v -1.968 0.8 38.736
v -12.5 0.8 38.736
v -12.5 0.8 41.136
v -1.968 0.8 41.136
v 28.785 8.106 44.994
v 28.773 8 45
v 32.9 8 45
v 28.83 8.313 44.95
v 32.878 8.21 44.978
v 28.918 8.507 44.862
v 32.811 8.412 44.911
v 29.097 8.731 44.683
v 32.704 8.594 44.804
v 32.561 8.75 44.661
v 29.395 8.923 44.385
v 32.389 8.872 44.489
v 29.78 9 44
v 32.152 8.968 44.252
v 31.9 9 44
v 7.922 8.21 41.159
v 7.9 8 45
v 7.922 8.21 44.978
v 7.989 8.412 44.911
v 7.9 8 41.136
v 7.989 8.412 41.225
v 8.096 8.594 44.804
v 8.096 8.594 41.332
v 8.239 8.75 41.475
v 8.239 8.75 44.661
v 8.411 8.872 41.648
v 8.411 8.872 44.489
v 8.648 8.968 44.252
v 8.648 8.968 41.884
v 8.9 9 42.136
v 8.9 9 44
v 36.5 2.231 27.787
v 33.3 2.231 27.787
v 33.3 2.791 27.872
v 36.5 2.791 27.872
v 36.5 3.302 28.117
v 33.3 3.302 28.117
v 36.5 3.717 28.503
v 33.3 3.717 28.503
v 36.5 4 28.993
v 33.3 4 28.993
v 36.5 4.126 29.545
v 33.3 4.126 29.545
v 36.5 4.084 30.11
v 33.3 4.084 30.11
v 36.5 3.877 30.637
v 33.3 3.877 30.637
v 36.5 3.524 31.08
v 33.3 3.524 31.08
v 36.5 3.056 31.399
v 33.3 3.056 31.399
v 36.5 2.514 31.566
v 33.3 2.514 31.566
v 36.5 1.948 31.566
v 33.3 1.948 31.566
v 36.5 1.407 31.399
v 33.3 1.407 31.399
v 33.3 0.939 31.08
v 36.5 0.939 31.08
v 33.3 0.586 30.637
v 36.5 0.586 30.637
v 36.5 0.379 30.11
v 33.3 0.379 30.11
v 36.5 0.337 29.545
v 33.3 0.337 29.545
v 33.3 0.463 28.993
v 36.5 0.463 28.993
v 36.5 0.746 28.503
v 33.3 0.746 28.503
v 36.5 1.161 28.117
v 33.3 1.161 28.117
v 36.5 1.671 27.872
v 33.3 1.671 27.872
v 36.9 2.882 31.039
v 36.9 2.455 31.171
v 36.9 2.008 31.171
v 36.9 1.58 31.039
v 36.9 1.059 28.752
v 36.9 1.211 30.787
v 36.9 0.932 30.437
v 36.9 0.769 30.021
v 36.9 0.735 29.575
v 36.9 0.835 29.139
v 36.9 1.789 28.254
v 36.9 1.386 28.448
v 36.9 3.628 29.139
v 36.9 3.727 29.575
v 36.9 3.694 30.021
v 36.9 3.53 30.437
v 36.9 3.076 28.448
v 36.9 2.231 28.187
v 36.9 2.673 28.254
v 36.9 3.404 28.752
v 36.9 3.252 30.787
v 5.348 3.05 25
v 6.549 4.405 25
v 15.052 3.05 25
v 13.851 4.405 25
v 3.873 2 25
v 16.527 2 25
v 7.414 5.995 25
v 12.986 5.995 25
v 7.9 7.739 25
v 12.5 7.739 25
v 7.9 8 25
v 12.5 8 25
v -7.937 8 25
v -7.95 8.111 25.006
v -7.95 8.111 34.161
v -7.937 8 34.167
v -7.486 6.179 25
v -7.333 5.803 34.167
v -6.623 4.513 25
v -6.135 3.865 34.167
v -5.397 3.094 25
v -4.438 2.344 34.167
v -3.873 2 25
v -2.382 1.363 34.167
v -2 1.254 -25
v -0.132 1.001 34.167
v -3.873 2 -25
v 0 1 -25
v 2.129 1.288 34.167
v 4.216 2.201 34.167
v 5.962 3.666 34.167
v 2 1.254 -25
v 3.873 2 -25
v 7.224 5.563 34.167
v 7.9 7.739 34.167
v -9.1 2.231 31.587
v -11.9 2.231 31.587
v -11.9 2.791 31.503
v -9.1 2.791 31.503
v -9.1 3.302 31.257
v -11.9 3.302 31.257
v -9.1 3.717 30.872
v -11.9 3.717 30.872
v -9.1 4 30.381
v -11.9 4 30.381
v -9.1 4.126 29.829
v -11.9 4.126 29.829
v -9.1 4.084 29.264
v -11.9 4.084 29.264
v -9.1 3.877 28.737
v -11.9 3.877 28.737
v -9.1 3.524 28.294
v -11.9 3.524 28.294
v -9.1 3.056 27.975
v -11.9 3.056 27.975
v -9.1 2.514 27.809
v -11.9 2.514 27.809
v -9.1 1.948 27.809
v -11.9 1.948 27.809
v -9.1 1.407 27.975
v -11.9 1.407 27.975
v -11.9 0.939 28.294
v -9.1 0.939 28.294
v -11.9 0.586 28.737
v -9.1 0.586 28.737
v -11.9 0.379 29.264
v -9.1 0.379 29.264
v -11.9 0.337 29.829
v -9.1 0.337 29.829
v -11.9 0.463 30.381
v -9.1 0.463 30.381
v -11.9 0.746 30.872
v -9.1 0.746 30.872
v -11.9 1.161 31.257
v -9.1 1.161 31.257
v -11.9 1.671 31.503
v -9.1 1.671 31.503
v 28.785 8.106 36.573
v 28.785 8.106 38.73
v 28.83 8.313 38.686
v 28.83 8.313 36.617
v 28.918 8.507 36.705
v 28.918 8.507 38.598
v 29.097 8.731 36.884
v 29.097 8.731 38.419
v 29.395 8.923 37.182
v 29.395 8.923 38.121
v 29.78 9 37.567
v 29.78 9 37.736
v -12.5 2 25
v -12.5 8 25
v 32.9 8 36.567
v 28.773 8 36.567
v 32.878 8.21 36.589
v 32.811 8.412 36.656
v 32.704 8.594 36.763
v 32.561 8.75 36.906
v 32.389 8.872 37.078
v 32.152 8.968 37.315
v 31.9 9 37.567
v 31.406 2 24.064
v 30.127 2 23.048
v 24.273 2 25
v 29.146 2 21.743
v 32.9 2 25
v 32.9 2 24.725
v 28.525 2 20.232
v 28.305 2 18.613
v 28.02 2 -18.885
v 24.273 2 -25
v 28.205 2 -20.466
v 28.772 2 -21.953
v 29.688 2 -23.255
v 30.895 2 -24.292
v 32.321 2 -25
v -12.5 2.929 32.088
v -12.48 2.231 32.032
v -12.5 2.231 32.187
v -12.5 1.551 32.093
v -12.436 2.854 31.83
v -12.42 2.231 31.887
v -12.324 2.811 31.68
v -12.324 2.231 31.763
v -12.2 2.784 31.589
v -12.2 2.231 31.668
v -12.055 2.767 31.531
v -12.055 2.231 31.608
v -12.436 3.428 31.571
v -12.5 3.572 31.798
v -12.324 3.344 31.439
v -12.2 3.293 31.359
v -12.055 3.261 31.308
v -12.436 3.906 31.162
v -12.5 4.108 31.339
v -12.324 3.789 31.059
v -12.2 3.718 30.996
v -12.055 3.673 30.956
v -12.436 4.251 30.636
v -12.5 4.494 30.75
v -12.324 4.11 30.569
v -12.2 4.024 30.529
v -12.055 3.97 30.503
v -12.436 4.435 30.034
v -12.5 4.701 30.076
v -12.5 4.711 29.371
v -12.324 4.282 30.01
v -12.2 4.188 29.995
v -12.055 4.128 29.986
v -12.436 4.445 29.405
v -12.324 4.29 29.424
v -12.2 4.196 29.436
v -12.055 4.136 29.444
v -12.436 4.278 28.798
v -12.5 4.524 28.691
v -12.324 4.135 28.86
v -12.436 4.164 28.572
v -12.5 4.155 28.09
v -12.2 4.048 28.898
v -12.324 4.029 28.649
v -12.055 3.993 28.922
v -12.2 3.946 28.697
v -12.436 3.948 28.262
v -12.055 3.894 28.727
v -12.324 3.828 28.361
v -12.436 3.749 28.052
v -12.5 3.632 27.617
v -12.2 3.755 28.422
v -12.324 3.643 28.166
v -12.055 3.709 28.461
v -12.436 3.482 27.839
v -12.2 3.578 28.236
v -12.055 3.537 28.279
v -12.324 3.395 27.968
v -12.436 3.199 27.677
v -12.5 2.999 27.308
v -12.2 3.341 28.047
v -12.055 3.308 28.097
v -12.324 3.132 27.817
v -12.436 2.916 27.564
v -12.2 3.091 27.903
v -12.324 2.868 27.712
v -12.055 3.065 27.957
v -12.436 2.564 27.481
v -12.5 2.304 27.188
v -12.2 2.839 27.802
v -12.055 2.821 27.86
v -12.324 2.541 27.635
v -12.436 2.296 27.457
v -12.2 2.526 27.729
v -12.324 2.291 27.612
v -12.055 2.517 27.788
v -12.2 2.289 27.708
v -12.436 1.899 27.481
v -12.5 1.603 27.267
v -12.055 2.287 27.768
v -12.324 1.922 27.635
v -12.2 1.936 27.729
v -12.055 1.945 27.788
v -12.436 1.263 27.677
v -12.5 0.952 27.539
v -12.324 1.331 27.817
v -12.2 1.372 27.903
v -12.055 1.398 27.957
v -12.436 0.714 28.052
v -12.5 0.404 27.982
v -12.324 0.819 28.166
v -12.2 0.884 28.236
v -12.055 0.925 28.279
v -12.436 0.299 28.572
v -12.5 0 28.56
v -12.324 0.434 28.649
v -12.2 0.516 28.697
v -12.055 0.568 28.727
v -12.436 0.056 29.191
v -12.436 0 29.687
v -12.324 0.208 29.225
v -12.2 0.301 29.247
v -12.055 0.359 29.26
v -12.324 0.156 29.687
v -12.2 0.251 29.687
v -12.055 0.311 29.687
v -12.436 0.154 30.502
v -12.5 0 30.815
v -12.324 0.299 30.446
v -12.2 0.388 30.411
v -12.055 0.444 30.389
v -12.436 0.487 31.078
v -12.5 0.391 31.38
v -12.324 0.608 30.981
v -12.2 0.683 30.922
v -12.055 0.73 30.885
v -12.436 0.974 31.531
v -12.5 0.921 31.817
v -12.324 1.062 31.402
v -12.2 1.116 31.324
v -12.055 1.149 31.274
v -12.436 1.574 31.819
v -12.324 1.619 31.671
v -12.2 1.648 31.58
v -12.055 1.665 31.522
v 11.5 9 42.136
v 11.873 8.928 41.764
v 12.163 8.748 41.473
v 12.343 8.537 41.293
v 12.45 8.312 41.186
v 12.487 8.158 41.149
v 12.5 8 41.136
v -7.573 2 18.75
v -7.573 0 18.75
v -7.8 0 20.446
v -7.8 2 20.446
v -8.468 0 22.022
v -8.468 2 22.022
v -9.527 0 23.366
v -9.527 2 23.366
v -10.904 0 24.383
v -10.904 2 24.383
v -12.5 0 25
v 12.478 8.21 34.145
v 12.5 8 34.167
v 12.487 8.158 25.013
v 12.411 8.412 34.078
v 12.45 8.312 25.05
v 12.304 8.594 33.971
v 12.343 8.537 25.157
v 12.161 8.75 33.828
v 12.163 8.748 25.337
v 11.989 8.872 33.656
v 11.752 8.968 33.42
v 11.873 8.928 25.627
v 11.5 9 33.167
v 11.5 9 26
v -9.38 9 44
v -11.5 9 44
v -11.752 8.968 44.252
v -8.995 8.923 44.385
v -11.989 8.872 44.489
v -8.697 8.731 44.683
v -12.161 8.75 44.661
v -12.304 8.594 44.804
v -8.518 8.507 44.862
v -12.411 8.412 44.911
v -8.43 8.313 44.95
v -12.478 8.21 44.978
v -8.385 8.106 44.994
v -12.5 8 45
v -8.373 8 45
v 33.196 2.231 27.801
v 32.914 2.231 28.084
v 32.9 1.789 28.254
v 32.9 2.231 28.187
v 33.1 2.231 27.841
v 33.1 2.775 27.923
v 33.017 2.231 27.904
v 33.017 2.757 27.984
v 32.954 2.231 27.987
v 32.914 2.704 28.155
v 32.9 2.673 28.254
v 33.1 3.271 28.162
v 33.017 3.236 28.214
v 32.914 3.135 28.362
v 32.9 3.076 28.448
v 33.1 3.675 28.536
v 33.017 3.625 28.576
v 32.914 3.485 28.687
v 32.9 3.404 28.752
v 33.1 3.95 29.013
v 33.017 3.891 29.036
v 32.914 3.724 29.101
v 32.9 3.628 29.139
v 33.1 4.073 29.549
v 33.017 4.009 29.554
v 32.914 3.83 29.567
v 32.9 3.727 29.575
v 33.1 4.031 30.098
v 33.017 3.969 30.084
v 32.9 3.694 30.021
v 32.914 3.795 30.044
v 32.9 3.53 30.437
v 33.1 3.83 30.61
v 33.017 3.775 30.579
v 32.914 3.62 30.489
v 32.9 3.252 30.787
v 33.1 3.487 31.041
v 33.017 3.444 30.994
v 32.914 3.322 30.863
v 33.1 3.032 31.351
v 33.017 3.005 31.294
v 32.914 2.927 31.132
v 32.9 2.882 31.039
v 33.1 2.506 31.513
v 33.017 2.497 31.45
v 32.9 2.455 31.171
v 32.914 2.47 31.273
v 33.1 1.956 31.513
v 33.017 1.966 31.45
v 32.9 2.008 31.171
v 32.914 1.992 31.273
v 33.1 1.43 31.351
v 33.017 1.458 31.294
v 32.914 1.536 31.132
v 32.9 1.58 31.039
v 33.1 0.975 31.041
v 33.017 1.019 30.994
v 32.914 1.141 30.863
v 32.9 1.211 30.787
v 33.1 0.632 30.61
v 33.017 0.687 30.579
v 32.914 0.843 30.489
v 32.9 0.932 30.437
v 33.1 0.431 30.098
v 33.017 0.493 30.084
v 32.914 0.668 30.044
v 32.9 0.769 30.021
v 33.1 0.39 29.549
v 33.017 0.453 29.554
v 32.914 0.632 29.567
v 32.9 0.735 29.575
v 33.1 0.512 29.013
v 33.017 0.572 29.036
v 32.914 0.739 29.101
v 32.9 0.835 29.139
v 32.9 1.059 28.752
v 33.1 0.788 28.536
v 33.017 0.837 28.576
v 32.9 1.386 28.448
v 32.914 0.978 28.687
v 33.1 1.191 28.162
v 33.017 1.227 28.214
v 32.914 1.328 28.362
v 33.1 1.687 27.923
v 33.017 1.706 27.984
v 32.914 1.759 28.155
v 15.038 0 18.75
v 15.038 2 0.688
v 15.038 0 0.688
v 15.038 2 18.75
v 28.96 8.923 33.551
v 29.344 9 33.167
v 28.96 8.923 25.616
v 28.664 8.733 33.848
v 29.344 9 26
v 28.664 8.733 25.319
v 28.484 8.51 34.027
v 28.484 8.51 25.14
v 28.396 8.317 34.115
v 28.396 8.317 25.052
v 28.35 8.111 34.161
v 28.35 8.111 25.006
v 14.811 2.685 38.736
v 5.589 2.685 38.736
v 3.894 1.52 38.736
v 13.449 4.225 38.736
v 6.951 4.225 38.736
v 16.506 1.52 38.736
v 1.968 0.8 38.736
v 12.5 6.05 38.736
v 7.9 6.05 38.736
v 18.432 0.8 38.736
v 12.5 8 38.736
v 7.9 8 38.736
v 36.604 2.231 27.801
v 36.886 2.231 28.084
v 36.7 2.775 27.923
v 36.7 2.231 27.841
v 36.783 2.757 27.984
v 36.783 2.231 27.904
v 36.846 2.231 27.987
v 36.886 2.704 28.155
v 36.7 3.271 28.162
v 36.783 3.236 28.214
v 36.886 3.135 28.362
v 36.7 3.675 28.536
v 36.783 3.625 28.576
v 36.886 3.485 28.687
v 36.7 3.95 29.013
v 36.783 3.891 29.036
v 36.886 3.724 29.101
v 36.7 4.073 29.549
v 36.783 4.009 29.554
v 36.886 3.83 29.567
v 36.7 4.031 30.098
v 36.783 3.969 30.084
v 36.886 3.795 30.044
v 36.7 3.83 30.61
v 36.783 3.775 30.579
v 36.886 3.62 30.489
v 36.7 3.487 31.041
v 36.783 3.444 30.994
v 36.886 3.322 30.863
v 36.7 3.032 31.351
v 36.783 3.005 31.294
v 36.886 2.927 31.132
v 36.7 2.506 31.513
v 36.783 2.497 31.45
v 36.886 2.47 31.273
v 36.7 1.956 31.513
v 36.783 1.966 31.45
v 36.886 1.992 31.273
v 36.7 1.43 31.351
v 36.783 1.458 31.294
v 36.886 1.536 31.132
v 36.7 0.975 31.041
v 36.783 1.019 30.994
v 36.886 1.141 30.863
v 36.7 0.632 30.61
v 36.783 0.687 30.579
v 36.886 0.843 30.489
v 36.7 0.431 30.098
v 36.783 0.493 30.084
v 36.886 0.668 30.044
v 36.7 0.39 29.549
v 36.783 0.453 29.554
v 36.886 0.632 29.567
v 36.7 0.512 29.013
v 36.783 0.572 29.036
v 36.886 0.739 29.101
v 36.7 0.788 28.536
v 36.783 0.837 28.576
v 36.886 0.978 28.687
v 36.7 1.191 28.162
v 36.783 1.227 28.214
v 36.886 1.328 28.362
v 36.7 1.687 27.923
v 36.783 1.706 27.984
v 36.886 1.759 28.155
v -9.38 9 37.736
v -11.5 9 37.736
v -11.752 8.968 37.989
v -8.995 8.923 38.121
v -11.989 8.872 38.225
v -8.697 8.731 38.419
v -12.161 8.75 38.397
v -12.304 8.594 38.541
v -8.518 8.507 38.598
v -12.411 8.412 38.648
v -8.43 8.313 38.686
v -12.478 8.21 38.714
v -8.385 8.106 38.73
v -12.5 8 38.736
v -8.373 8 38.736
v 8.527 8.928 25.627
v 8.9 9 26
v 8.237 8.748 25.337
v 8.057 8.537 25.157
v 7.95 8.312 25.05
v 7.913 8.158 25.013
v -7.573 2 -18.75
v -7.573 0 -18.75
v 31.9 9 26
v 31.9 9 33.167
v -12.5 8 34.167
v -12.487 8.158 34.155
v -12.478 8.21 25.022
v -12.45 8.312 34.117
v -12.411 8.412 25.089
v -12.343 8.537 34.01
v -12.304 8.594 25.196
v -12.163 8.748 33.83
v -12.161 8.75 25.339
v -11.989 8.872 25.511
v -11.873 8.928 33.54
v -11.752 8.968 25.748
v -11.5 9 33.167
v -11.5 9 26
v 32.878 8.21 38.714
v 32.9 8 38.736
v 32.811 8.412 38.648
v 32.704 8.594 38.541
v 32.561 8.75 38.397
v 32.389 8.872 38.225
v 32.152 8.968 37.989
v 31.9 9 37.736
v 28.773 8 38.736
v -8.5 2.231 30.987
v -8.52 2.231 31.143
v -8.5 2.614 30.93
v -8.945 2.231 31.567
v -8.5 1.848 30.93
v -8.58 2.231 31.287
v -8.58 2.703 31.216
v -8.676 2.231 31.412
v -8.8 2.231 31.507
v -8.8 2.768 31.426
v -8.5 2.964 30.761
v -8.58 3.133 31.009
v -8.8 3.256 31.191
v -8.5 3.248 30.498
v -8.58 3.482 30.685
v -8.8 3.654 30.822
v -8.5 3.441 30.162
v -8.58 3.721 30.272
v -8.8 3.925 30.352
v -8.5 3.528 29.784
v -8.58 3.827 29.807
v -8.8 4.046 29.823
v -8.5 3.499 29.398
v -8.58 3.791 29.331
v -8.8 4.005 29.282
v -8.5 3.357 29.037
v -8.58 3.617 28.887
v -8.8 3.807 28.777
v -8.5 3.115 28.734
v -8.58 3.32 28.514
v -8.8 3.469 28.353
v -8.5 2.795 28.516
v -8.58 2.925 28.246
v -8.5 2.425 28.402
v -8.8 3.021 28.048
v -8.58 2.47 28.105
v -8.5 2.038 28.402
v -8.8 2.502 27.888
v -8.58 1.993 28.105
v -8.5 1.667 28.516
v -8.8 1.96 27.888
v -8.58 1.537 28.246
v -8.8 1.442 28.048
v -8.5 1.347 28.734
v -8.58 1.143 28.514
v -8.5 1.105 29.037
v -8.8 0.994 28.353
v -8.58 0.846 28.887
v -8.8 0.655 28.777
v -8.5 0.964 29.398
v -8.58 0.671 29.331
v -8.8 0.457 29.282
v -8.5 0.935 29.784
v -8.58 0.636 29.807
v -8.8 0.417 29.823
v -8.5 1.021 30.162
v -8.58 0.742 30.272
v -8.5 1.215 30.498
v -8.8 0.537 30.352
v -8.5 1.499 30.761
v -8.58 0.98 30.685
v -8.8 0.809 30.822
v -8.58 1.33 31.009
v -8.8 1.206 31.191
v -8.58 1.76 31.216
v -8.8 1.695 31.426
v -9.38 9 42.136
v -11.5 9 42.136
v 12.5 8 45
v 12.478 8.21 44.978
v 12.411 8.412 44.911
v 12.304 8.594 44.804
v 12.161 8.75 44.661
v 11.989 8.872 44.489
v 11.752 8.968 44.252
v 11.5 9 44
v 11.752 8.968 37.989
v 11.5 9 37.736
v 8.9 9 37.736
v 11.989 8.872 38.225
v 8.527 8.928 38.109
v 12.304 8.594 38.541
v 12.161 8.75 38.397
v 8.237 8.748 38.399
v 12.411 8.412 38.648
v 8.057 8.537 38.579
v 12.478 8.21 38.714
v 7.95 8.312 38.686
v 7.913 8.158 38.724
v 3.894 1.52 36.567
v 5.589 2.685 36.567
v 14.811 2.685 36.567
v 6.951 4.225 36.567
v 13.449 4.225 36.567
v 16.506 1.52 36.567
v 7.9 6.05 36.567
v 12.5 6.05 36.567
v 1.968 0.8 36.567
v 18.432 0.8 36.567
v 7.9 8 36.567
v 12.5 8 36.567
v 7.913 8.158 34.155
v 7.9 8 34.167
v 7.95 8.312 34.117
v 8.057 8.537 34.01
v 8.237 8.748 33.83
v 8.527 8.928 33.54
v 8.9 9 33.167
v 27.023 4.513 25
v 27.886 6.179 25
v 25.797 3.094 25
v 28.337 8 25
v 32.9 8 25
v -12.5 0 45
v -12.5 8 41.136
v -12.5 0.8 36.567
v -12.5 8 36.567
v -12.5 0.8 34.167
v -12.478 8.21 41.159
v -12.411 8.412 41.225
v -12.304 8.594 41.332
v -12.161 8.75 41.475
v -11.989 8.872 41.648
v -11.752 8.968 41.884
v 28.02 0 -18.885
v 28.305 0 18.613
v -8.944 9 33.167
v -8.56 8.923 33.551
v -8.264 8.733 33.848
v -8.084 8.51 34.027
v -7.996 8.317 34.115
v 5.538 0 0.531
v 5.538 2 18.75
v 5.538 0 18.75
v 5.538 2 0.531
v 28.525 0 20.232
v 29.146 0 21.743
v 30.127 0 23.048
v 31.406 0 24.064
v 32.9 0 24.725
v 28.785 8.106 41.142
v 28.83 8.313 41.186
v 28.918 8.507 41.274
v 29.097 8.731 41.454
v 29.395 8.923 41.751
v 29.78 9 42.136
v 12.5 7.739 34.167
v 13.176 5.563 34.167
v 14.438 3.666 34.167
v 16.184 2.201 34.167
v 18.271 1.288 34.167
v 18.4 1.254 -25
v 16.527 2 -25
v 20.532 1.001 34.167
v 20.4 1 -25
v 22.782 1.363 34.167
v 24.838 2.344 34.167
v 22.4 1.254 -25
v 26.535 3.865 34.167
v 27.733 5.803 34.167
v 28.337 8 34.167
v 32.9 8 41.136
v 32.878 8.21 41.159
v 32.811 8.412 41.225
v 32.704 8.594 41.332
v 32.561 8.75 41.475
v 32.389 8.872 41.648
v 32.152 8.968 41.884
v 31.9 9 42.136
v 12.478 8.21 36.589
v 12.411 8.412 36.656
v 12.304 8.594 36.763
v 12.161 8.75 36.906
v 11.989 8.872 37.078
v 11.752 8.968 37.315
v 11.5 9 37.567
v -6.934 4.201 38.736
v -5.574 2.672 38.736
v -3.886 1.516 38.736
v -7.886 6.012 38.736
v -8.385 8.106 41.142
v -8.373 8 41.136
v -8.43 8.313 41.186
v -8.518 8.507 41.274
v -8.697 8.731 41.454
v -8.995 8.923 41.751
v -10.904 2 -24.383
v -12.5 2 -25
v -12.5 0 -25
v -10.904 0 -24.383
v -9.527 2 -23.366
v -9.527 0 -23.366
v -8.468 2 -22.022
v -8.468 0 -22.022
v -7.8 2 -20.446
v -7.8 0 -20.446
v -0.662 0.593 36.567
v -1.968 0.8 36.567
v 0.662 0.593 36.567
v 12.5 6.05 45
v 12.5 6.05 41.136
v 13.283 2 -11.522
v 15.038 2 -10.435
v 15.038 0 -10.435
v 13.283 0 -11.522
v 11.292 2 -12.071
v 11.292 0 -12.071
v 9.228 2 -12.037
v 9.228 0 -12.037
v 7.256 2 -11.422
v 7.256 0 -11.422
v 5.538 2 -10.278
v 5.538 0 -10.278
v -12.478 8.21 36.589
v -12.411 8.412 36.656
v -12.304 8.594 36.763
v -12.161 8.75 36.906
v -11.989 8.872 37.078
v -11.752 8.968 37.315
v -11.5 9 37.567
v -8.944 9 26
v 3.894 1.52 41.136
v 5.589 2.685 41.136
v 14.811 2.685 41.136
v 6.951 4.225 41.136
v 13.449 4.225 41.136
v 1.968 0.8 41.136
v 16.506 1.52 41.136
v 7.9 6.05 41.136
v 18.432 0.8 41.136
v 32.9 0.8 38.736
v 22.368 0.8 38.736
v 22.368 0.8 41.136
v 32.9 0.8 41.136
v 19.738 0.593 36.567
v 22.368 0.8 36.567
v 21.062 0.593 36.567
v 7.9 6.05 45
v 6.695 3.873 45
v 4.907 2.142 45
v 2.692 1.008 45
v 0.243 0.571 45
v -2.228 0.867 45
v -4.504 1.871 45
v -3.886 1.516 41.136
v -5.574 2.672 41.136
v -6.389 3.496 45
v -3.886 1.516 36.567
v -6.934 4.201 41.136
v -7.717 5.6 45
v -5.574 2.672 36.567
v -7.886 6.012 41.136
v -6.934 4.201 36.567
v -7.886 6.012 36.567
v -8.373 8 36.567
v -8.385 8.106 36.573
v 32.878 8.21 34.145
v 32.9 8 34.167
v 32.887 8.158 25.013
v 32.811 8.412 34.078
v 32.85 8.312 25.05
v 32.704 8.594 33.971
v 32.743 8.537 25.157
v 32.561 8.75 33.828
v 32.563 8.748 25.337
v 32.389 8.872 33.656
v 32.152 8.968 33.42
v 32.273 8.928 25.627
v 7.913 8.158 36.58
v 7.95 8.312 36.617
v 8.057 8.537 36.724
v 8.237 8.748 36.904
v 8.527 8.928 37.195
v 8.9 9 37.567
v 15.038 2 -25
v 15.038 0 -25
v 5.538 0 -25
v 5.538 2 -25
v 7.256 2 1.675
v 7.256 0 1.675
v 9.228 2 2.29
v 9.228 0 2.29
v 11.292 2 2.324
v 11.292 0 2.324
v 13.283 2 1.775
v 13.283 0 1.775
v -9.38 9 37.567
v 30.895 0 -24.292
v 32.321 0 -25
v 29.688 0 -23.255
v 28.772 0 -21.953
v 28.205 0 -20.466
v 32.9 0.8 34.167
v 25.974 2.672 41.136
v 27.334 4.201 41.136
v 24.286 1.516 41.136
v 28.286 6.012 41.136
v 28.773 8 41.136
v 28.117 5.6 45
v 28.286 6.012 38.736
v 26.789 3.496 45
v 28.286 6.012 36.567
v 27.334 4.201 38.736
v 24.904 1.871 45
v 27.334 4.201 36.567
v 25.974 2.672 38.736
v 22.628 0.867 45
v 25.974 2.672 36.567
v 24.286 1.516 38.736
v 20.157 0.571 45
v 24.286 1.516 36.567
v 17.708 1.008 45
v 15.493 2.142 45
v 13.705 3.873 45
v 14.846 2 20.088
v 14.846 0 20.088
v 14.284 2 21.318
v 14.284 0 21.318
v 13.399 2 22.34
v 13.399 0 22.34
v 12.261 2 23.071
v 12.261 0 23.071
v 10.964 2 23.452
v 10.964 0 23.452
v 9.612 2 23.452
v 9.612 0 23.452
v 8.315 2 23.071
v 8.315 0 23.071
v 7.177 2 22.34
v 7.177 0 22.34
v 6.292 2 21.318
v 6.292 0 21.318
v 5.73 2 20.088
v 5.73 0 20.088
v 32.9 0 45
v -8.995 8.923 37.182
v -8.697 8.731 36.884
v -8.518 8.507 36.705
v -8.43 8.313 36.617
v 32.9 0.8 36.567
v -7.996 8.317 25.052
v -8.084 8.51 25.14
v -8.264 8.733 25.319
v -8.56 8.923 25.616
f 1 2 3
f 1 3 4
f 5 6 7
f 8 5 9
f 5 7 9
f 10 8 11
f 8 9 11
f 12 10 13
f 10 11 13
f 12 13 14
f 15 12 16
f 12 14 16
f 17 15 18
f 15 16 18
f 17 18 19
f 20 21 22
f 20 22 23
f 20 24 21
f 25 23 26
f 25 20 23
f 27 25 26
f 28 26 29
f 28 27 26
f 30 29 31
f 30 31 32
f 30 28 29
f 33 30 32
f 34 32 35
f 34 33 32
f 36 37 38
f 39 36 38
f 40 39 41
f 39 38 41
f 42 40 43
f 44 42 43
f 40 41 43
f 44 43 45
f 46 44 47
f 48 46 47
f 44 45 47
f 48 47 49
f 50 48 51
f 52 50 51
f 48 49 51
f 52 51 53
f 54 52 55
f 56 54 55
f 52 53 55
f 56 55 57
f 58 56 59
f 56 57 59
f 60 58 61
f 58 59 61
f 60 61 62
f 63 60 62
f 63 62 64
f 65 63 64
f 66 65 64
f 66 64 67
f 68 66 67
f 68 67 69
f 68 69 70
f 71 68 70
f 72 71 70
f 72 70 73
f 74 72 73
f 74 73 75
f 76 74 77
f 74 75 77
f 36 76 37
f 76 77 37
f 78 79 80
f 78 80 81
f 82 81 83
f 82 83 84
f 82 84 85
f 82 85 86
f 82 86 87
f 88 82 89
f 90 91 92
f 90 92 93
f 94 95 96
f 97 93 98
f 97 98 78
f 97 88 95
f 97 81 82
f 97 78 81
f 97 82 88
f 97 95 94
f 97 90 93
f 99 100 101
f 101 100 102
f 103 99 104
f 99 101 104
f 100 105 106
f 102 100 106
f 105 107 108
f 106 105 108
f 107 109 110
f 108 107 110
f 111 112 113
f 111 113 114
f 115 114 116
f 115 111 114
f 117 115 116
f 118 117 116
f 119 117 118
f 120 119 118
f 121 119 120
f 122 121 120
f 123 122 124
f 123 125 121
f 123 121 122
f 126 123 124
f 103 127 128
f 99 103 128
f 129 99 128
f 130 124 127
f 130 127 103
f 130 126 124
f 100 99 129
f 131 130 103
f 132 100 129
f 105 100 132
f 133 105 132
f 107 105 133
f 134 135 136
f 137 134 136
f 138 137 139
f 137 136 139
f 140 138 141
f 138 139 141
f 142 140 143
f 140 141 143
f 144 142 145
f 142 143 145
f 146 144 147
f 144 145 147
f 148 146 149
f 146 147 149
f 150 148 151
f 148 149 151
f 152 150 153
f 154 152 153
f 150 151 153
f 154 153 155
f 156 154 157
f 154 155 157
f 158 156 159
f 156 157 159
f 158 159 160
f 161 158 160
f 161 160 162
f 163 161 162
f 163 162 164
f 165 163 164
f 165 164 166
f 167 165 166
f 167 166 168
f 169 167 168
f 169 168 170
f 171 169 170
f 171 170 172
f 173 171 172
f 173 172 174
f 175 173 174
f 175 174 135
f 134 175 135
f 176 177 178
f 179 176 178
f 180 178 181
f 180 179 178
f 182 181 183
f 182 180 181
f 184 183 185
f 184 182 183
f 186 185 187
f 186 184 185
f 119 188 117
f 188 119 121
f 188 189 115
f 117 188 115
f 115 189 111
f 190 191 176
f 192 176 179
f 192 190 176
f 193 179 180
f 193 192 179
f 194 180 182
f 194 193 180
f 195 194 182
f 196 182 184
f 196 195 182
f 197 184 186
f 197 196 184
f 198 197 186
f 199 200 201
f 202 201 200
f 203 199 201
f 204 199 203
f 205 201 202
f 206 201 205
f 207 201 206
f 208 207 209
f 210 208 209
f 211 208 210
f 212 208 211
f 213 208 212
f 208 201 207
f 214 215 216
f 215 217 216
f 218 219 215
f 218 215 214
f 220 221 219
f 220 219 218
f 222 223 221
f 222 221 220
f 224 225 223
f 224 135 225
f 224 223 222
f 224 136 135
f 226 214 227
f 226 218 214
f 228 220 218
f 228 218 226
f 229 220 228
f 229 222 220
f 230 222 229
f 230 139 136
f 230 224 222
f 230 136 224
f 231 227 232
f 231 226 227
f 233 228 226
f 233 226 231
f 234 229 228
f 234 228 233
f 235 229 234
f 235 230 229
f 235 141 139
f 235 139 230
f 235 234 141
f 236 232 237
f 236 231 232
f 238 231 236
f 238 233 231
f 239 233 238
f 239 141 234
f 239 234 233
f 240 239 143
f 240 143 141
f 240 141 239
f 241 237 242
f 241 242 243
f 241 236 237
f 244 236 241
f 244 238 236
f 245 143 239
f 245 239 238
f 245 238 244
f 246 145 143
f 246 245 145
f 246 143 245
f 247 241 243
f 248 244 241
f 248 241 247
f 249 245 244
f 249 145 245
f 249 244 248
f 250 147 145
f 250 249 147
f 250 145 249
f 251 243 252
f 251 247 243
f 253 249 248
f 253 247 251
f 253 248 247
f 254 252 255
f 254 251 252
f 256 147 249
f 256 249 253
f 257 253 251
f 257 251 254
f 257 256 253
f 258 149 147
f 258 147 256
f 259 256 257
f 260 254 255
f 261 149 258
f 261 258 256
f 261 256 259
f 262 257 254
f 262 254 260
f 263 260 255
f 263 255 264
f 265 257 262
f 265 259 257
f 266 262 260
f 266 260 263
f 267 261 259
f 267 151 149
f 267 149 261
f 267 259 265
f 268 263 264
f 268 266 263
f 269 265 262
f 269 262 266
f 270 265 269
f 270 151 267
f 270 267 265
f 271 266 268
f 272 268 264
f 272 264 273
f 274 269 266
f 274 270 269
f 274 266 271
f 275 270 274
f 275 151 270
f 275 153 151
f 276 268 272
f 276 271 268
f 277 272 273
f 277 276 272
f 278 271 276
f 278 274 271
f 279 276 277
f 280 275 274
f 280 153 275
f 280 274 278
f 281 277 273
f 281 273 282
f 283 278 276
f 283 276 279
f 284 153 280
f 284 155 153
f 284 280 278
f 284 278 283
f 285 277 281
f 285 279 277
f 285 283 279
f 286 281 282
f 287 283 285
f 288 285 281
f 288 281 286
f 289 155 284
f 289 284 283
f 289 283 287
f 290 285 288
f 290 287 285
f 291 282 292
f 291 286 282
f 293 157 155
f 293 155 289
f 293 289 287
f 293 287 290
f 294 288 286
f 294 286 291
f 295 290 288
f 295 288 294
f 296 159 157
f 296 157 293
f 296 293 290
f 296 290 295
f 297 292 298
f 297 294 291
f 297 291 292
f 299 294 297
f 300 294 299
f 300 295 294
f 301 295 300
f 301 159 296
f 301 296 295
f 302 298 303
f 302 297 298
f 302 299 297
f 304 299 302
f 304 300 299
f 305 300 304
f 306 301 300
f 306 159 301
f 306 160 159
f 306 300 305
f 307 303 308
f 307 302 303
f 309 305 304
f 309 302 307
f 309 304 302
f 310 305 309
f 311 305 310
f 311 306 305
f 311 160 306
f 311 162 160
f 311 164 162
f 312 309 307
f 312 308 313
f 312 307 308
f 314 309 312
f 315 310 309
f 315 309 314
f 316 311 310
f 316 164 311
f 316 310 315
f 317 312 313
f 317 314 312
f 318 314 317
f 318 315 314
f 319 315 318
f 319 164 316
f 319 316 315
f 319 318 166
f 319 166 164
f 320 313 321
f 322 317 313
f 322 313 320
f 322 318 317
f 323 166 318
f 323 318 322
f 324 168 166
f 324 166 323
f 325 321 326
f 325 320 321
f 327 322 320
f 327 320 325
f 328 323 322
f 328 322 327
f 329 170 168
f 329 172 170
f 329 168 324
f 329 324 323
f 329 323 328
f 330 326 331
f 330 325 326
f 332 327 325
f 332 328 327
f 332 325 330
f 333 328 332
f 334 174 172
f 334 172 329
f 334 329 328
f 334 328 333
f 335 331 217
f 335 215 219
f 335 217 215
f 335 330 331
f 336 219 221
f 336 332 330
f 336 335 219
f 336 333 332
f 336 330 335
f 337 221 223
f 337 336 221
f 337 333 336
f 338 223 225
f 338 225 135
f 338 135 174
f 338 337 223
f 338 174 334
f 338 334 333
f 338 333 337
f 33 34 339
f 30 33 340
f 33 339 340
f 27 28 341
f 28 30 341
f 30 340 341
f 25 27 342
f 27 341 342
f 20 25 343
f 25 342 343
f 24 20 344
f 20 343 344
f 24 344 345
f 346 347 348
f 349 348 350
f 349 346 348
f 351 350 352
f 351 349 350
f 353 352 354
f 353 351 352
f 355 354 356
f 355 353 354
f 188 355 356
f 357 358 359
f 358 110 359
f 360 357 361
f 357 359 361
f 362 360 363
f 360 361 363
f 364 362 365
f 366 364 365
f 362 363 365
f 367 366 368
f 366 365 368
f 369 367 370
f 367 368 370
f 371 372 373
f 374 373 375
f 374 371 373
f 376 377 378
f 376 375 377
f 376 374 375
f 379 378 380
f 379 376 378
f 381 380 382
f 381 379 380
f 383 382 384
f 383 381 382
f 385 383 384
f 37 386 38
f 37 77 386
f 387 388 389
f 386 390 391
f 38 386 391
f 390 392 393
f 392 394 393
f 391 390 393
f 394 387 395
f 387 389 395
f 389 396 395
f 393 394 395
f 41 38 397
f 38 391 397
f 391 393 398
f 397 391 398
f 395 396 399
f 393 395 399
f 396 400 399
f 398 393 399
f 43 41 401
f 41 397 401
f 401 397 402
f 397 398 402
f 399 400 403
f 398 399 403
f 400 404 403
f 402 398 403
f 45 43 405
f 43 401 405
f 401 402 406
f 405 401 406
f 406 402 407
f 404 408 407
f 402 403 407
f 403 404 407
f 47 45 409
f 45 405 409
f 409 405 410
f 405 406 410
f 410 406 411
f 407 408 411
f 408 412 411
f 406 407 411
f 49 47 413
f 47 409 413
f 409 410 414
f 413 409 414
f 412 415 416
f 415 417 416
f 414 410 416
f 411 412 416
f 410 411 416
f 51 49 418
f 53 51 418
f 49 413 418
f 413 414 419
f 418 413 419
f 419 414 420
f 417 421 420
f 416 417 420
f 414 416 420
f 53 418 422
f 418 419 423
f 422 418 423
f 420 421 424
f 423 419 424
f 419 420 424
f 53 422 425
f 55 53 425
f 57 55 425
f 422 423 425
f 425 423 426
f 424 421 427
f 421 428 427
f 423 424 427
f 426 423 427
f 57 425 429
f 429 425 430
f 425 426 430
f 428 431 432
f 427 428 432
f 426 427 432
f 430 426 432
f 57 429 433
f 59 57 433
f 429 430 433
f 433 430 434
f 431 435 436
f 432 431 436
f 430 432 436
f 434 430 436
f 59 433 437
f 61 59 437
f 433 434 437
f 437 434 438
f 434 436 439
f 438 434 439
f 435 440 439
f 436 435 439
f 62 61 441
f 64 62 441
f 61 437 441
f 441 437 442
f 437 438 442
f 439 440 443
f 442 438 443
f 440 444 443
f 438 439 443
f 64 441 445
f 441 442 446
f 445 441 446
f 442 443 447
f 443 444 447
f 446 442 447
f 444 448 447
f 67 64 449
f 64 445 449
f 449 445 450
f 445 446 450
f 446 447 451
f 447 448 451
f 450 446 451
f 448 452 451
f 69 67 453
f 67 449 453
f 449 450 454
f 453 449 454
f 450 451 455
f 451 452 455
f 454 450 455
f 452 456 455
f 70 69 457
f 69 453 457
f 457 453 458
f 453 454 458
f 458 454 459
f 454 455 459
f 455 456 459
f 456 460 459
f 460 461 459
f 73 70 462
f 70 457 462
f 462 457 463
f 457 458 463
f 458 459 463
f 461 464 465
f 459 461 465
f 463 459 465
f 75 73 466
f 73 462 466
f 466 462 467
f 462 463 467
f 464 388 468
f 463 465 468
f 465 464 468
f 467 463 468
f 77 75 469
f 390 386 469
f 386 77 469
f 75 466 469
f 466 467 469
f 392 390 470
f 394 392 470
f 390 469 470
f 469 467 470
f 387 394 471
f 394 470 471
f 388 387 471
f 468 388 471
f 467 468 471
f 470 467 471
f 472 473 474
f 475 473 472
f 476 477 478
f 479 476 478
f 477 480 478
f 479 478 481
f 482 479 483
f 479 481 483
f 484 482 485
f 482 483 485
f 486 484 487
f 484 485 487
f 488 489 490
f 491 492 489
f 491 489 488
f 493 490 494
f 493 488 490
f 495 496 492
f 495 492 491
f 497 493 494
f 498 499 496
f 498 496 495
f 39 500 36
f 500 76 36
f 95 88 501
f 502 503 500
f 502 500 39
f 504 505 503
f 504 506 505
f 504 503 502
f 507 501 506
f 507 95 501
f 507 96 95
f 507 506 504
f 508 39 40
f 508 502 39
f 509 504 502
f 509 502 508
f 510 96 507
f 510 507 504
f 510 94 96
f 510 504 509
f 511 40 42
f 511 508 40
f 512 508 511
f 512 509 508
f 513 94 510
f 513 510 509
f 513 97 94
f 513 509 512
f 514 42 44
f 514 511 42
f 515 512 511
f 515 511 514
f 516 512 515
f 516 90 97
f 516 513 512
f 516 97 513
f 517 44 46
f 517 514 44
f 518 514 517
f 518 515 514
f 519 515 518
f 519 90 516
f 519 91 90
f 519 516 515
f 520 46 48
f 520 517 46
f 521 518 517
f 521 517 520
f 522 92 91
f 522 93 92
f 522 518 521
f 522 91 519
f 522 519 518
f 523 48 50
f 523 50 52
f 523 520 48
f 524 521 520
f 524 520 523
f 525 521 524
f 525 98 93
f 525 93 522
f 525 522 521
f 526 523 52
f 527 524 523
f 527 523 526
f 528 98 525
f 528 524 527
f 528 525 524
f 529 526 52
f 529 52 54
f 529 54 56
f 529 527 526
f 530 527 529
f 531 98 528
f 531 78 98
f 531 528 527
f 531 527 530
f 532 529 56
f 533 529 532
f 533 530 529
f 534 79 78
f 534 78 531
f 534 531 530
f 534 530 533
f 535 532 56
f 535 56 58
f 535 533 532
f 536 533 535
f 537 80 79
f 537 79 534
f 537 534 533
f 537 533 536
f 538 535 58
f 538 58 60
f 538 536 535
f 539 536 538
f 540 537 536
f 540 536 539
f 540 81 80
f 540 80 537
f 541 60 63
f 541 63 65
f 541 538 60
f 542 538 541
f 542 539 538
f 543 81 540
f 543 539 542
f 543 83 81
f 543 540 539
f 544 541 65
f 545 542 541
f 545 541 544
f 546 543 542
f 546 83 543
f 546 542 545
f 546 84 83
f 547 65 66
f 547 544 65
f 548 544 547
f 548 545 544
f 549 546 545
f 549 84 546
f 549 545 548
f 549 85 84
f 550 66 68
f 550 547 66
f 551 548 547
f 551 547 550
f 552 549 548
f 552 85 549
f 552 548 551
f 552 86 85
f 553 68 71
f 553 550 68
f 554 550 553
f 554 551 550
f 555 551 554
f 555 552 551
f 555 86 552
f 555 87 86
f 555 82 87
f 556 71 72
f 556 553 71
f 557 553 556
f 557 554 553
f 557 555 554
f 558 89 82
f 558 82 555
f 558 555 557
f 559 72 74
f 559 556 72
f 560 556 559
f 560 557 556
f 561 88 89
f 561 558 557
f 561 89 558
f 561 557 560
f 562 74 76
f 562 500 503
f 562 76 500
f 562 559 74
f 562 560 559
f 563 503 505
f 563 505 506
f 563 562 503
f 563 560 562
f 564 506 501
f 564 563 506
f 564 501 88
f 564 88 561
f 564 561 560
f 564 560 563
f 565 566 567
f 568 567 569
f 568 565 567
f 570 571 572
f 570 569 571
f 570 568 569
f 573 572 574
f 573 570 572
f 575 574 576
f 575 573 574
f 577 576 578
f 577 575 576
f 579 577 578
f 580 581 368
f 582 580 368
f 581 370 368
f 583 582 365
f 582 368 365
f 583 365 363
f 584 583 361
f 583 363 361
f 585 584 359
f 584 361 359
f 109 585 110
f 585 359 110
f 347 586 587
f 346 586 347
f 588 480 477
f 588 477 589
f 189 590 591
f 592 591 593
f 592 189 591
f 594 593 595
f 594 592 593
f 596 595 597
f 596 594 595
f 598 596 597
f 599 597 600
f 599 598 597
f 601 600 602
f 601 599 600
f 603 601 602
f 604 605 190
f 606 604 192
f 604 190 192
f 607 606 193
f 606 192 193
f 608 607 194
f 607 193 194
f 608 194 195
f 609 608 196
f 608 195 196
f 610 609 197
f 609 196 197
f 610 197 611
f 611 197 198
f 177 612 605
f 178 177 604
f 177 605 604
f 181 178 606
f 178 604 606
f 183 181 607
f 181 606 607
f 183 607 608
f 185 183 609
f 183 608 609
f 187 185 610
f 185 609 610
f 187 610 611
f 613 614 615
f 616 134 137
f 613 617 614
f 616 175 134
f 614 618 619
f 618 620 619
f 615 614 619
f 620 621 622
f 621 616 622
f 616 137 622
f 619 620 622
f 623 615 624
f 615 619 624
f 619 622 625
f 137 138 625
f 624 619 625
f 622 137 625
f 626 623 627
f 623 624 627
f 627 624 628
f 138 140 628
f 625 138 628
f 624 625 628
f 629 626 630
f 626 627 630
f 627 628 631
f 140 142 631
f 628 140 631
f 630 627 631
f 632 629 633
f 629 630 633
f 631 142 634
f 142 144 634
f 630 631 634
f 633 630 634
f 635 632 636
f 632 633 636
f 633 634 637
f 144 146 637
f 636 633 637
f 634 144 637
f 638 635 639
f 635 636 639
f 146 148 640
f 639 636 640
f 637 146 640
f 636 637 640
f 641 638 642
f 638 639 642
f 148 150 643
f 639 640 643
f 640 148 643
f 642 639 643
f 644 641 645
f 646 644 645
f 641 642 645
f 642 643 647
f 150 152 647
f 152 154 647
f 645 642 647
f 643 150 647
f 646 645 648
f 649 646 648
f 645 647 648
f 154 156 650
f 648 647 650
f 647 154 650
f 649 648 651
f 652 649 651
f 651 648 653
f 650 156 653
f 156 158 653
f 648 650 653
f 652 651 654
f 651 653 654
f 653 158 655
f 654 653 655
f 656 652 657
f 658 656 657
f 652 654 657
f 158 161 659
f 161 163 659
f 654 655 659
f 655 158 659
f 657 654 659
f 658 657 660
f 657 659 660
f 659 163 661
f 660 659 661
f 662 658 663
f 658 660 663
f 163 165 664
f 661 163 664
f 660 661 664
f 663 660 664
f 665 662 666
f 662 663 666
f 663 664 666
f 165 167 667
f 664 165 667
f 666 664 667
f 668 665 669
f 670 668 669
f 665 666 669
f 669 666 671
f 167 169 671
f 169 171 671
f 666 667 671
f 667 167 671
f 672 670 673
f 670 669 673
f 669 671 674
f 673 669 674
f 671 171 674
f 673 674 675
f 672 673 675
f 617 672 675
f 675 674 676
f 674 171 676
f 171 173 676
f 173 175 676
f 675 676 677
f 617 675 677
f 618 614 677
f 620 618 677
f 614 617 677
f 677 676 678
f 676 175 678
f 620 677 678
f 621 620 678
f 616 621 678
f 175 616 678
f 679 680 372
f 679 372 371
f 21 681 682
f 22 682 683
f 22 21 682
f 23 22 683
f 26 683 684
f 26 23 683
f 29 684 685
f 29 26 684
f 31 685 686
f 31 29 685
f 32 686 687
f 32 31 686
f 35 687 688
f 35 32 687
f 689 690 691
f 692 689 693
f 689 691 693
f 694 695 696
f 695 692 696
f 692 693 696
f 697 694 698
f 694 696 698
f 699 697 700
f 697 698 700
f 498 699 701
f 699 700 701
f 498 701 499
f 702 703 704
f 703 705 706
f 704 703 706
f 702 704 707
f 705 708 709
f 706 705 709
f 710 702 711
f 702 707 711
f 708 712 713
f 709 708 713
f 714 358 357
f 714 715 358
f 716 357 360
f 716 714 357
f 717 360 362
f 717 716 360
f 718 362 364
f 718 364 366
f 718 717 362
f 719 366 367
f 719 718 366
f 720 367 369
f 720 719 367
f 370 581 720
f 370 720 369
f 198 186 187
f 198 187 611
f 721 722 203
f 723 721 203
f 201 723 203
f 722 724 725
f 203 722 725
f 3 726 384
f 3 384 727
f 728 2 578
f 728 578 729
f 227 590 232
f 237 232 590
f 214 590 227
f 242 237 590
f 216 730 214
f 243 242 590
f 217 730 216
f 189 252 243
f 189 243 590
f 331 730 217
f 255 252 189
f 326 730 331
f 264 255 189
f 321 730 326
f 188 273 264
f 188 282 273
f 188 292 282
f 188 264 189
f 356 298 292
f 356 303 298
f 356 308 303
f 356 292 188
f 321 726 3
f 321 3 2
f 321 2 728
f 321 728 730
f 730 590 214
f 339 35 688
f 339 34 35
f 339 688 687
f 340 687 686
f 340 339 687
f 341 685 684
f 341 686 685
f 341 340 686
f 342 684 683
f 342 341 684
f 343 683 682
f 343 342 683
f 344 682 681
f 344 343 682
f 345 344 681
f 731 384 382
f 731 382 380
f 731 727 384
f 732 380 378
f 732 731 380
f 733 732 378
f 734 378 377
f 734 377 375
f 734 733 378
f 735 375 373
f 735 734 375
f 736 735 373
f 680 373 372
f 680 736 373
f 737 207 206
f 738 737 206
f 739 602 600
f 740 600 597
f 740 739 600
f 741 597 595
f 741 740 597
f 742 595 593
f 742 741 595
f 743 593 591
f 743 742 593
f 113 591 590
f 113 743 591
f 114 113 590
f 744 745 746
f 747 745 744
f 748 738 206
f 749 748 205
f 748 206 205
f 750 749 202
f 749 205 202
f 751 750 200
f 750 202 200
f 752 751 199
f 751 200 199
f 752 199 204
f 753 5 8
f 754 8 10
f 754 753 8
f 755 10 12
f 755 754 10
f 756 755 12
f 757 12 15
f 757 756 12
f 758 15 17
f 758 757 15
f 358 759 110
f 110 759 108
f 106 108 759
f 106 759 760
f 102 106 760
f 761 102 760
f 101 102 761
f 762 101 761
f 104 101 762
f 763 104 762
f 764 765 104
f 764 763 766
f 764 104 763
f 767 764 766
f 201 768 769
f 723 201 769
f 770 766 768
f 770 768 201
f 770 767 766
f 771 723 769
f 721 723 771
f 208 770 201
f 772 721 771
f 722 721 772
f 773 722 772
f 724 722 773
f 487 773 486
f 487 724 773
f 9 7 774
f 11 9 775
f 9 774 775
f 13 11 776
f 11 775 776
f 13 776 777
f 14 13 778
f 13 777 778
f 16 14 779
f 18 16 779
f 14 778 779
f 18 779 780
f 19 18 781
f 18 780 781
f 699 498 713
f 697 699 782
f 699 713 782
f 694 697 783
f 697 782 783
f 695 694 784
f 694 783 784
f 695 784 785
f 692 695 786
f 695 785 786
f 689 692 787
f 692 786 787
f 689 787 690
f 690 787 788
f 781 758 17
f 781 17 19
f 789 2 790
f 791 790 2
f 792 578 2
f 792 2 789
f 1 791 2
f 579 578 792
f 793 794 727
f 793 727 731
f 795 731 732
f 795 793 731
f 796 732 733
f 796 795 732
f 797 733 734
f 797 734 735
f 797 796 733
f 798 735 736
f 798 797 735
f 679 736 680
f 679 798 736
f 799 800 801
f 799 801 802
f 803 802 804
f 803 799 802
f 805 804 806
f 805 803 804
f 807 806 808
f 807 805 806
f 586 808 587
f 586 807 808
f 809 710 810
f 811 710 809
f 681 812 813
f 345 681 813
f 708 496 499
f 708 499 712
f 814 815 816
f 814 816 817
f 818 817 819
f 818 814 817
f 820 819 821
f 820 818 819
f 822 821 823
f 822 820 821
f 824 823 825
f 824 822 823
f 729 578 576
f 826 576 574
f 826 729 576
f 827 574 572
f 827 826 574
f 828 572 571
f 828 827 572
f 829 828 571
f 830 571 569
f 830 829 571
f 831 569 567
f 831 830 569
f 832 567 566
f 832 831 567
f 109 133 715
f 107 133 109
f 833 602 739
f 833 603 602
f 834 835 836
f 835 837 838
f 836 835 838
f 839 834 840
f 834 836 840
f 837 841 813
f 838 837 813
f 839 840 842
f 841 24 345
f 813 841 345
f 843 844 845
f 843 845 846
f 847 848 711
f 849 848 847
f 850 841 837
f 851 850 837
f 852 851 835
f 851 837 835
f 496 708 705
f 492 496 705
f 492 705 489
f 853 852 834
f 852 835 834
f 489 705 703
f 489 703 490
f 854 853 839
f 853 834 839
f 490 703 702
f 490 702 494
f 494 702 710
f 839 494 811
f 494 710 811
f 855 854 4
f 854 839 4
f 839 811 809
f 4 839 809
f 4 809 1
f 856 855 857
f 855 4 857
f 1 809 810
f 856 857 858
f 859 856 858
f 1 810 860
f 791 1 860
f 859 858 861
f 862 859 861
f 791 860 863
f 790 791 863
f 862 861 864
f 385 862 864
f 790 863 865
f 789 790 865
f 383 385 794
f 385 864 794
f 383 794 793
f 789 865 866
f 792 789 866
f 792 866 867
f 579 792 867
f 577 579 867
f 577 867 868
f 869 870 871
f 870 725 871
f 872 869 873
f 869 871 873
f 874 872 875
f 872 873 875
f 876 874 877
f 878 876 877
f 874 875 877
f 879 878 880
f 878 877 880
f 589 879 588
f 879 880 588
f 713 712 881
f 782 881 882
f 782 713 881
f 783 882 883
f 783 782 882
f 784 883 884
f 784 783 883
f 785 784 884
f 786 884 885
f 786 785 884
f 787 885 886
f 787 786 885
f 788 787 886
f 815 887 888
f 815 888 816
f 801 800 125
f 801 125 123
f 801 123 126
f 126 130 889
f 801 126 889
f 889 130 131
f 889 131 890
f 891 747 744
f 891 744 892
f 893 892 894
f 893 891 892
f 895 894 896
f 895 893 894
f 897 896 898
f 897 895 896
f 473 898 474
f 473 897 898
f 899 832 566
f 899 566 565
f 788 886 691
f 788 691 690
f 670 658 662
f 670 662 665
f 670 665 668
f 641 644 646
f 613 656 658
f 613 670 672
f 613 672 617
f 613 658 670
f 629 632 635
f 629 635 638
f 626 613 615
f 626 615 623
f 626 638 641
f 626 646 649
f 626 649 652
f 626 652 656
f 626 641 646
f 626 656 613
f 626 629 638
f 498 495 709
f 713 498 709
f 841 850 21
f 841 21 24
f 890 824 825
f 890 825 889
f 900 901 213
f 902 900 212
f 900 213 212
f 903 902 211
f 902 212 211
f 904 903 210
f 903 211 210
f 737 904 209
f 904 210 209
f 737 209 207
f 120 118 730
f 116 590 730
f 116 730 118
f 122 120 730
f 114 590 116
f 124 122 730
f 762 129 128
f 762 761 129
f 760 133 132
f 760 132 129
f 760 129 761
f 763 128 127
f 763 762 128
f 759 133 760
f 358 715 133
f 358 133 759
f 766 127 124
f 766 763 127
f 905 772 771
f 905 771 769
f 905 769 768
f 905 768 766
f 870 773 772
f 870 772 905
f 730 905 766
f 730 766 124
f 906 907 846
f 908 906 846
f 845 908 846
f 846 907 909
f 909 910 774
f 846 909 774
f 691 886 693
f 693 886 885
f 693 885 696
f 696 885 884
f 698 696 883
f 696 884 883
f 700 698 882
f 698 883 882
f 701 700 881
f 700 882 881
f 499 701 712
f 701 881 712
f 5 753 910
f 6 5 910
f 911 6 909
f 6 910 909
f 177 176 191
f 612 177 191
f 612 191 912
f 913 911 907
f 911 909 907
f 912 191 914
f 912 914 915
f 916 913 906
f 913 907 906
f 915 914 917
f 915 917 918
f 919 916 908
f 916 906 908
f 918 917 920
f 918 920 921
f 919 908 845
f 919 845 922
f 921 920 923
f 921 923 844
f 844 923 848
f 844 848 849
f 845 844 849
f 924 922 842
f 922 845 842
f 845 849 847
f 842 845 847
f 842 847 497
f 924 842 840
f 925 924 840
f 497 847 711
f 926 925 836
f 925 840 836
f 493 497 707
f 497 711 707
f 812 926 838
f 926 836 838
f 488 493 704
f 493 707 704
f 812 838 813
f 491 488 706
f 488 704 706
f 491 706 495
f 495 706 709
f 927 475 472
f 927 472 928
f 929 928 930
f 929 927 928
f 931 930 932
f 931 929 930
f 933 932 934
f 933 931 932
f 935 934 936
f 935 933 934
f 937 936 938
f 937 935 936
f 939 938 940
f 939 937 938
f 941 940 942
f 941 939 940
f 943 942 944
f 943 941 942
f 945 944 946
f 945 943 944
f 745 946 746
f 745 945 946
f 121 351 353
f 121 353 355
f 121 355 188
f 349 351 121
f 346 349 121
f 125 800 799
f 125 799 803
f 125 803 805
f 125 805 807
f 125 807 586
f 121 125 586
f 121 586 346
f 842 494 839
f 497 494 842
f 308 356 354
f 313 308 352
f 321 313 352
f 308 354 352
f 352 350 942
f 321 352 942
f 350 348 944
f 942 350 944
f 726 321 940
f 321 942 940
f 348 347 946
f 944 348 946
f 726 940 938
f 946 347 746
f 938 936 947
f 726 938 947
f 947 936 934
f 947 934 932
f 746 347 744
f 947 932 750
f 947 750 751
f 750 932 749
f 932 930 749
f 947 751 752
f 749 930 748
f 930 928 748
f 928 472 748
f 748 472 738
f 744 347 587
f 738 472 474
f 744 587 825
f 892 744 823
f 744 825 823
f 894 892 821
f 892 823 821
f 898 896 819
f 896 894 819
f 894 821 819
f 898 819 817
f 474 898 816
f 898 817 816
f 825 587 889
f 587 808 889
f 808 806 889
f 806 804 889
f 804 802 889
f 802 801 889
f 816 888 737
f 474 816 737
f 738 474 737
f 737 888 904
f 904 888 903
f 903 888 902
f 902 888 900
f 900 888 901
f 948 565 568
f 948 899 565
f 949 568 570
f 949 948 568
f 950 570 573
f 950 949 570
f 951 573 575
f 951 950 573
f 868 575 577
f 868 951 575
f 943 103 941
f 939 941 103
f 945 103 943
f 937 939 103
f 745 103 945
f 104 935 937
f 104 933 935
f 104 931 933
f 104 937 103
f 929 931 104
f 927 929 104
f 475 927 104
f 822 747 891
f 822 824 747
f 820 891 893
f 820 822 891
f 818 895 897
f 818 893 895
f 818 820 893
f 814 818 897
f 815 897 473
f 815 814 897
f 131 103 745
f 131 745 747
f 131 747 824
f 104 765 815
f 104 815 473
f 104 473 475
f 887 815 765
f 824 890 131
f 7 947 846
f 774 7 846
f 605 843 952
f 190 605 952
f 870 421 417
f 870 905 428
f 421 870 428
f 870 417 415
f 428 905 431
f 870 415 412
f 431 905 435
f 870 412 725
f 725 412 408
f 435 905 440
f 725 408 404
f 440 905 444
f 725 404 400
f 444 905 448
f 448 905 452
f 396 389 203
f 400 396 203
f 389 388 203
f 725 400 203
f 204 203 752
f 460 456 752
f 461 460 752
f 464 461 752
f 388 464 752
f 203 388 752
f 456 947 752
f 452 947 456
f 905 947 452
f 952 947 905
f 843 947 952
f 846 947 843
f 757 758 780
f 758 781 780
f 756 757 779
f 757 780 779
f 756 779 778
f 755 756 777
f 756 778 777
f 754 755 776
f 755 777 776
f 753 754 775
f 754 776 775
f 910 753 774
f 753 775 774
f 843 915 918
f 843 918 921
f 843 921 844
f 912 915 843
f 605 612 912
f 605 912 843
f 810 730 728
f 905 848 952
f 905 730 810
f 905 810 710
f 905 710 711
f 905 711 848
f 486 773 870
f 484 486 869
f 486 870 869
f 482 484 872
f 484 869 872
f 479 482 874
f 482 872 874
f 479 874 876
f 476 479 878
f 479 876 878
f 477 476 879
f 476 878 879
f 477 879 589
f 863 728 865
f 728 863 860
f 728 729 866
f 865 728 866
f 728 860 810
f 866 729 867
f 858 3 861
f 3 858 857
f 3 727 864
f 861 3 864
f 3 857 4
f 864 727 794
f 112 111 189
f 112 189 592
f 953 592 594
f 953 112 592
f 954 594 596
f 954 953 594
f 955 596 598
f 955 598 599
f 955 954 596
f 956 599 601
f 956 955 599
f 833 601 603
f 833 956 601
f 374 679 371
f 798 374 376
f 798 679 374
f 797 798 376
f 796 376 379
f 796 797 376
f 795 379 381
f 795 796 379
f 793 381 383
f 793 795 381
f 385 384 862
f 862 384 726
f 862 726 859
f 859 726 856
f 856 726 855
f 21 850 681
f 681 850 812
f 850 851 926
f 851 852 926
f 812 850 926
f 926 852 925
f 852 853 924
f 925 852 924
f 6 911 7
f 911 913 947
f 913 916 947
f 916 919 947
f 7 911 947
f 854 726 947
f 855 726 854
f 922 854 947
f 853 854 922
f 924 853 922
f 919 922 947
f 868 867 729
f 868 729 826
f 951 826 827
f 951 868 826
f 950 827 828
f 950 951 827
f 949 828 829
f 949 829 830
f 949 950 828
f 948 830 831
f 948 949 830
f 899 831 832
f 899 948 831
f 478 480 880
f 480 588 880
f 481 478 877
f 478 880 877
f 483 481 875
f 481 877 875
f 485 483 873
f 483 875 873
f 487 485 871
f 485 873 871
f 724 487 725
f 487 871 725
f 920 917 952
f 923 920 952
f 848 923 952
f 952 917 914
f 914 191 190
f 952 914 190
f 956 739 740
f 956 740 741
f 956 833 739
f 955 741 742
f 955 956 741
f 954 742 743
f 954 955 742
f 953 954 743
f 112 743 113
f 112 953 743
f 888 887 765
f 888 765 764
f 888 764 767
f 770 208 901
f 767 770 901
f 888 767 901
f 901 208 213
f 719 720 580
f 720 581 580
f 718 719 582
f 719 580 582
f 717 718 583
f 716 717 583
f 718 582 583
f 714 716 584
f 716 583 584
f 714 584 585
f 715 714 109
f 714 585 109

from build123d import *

# Parameters (mm, degrees)
SKETCH1_W           = 25
SKETCH1_H           = 90
BOSS_EXTRUDE1_DEPTH = 9
SKETCH4_W           = 8
SKETCH4_H           = 71
SKETCH5_W           = 25
SKETCH5_H           = 2.4
SKETCH5_W_2         = 28
FLANGE_SLOT_DEPTH   = 8.2
SKETCH6_W           = 8.432931683
SKETCH6_H           = 8.432931683
SKETCH18_W          = 25
SKETCH18_H          = 50
SYRINGE_BAY_DEPTH   = 7
SKETCH26_W          = 38.352553791
SKETCH26_H          = 20.215566654
CUT_EXTRUDE14_DEPTH = 10
LPATTERN3_COUNT     = 2
LPATTERN3_PITCH     = 20.4
SKETCH31_R          = 1.9
CUT_EXTRUDE16_DEPTH = 4
SKETCH33_R          = 1.9
BOSS_EXTRUDE2_DEPTH = 4
FILLET1_R           = 0.4
FILLET2_R           = 0.6
CUT_EXTRUDE17_DEPTH = 10
FILLET7_R           = 1


with BuildPart() as part:
    # Sketch1 → Boss-Extrude1 (new body)
    with BuildSketch(Plane(origin=(0, 0, 0), x_dir=(1, 0, 0), z_dir=(0, 1, 0))):
        Rectangle(SKETCH1_W, SKETCH1_H)
    extrude(amount=BOSS_EXTRUDE1_DEPTH)

    # Sketch4 → Syringe Body slot (revolve, cut)
    with BuildSketch(Plane(origin=(0, 9, 0), x_dir=(1, 0, 0), z_dir=(0, 1, 0))):
        with Locations((-4, 1.3)):
            Rectangle(SKETCH4_W, SKETCH4_H)
    revolve(axis=Axis((0, 9, -36.8), (0, 0, 1)), mode=Mode.SUBTRACT)

    # Sketch5 → Flange Slot (cut)
    with BuildSketch(Plane(origin=(0, 9, 0), x_dir=(1, 0, 0), z_dir=(0, 1, 0))):
        with Locations((0, -35.367068317)):
            Rectangle(SKETCH5_W, SKETCH5_H)
        with Locations((0, -39.936134865)):
            Rectangle(SKETCH5_W_2, SKETCH5_H)
    extrude(amount=-FLANGE_SLOT_DEPTH, mode=Mode.SUBTRACT)

    # Sketch6 → Plunger Slot (revolve, cut)
    with BuildSketch(Plane(origin=(0, 9, 0), x_dir=(1, 0, 0), z_dir=(0, 1, 0))):
        with Locations((-4.216465842, -40.783534159)):
            Rectangle(SKETCH6_W, SKETCH6_H)
    revolve(axis=Axis((0, 9, 45), (0, 0, -1)), mode=Mode.SUBTRACT)

    # Sketch18 → Syringe Bay (cut)
    with BuildSketch(Plane(origin=(0, 9, 0), x_dir=(1, 0, 0), z_dir=(0, 1, 0))):
        Rectangle(SKETCH18_W, SKETCH18_H)
    extrude(amount=-SYRINGE_BAY_DEPTH, mode=Mode.SUBTRACT)

    # Sketch26 → Cut-Extrude14 (cut)
    with BuildSketch(Plane(origin=(0, 9, 0), x_dir=(1, 0, 0), z_dir=(0, 1, 0))):
        with Locations((-0.72363309, 35.107783327)):
            Rectangle(SKETCH26_W, SKETCH26_H)
    extrude(amount=-CUT_EXTRUDE14_DEPTH, mode=Mode.SUBTRACT)


with BuildPart() as lpattern3_1:
    # LPattern3: pattern copy
    add(part.part.moved(Location(Vector(1, 0, 0) * (1 * LPATTERN3_PITCH))))


with BuildPart() as part_1:
    add(part.part)

    # Sketch31 → Cut-Extrude16 (cut)
    with BuildSketch(Plane.ZY.offset(12.5)):
        with Locations((29.687280392, 2.231257616)):
            Circle(SKETCH31_R)
    extrude(amount=-CUT_EXTRUDE16_DEPTH, mode=Mode.SUBTRACT)

    # Fillet2
    # the kernel refuses this fillet: 0.6 mm, written as the material it adds along each edge
    with BuildSketch(Plane(origin=(-8.5, 2.231257616, 29.687280392), x_dir=(0, 0, 1), z_dir=(0, -1, 0))) as fillet2_piece_1:
        with BuildLine():
            CenterArc((1.9 - FILLET2_R, FILLET2_R), FILLET2_R, 270, 90)
            Line((1.9 - FILLET2_R, 0), (1.9, 0))
            Line((1.9, 0), (1.9, FILLET2_R))
        make_face()
    revolve(axis=Axis((-8.5, 2.231257616, 29.687280392), (-1, 0, 0)))
    # the kernel refuses this fillet: 0.6 mm, written as the material it takes off along each edge
    with BuildSketch(Plane(origin=(-12.5, 2.231257616, 29.687280392), x_dir=(0, 0, 1), z_dir=(0, -1, 0))) as fillet2_2_piece_1:
        with BuildLine():
            CenterArc((1.9 + FILLET2_R, -FILLET2_R), FILLET2_R, 90, 90)
            Line((1.9, -FILLET2_R), (1.9, 0))
            Line((1.9, 0), (1.9 + FILLET2_R, 0))
        make_face()
    revolve(axis=Axis((-12.5, 2.231257616, 29.687280392), (-1, 0, 0)), mode=Mode.SUBTRACT)


with BuildPart() as body_3:
    # Sketch33 → Boss-Extrude2 (new body)
    with BuildSketch(Plane(origin=(32.9, 0, 0), x_dir=(0, 0, -1), z_dir=(1, 0, 0))):
        with Locations((-29.687280392, 2.231257616)):
            Circle(SKETCH33_R)
    extrude(amount=BOSS_EXTRUDE2_DEPTH)

    # Fillet1
    fillet1_edges = [body_3.edges().sort_by_distance(p)[0] for p in [
        (32.9, 2.231257616, 31.587280392),
        (36.9, 2.231257616, 31.587280392),
    ]]
    fillet(fillet1_edges, radius=FILLET1_R)


with BuildPart() as cut_extrude17_tool:
    # Sketch35 → Cut-Extrude17 (new body)
    with BuildSketch(Plane(origin=(0, 2, 0), x_dir=(1, 0, 0), z_dir=(0, 1, 0))):
        with BuildLine():
            Line((-7.572519934, 18.75), (-7.572519934, -18.75))
            ThreePointArc((-7.572519934, -18.75), (-14, -25.177480066), (-20.427480066, -18.75))
            Line((-20.427480066, -18.75), (-20.427480066, 18.75))
            ThreePointArc((-20.427480066, 18.75), (-14, 25.177480066), (-7.572519934, 18.75))
        make_face()
        with BuildLine():
            Line((15.038012539, 25.284497927), (15.038012539, 10.435091669))
            ThreePointArc((15.038012539, 10.435091669), (10.258664257, 12.127791533), (5.538012539, 10.277696889))
            Line((5.538012539, 10.277696889), (5.538012539, 25.284497927))
            ThreePointArc((5.538012539, 25.284497927), (10.288012539, 30.034497927), (15.038012539, 25.284497927))
        make_face()
        with BuildLine():
            Line((28.019587368, 18.885486869), (28.305082347, -18.61342635))
            ThreePointArc((28.305082347, -18.61342635), (34.781309827, -24.991786455), (41.159669932, -18.515558975))
            Line((41.159669932, -18.515558975), (40.874174953, 18.983354244))
            ThreePointArc((40.874174953, 18.983354244), (34.397947473, 25.361714349), (28.019587368, 18.885486869))
        make_face()
        with BuildLine():
            Line((15.038012539, -0.688026199), (15.038012539, -18.75))
            ThreePointArc((15.038012539, -18.75), (10.288012539, -23.5), (5.538012539, -18.75))
            Line((5.538012539, -18.75), (5.538012539, -0.530631419))
            ThreePointArc((5.538012539, -0.530631419), (10.258664257, -2.380726063), (15.038012539, -0.688026199))
        make_face()
    extrude(amount=-CUT_EXTRUDE17_DEPTH)


with BuildPart() as part_2:
    add(part_1.part)

    # Cut-Extrude17: cut by cut_extrude17_tool
    add(cut_extrude17_tool.part, mode=Mode.SUBTRACT)


with BuildPart() as lpattern3_1_1:
    add(lpattern3_1.part)

    # Cut-Extrude17: cut by cut_extrude17_tool
    add(cut_extrude17_tool.part, mode=Mode.SUBTRACT)

    # Combine2: union part, body 3
    add(part_2.part)
    add(body_3.part)

    # Fillet7
    fillet7_edges = [lpattern3_1_1.edges().sort_by_distance(p)[0] for p in [
        (7.9, 9, 29.583534158),
        (10.2, 9, 25),
        (30.65, 9, 25),
        (10.2, 9, 45),
        (32.9, 9, 37.651601591),
        (32.9, 9, 29.583534158),
        (7.9, 9, 37.651601591),
        (7.9, 9, 43.068067433),
        (10.2, 9, 41.136134865),
        (30.866465842, 9, 38.736134865),
        (-10.25, 9, 34.167068317),
        (12.5, 9, 37.651601591),
        (12.5, 9, 43.068067433),
        (-8.432931683, 9, 37.651601591),
        (-8.432931683, 9, 43.068067433),
        (-12.5, 9, 29.583534158),
        (-8, 9, 29.583534158),
        (12.5, 9, 29.583534158),
        (-12.5, 9, 37.651601591),
        (-12.5, 9, 43.068067433),
        (-10.466465842, 9, 45),
        (-10.466465842, 9, 38.736134865),
        (-10.466465842, 9, 36.567068317),
        (-10.466465842, 9, 41.136134865),
        (-10.25, 9, 25),
        (10.2, 9, 34.167068317),
        (10.2, 9, 36.567068317),
        (30.65, 9, 34.167068317),
        (32.9, 9, 43.068067433),
        (10.2, 9, 38.736134865),
        (30.866465842, 9, 41.136134865),
        (30.866465842, 9, 36.567068317),
        (30.866465842, 9, 45),
        (28.832931683, 9, 37.651601591),
        (28.832931683, 9, 43.068067433),
        (28.4, 9, 29.583534158),
    ]]
    fillet(fillet7_edges, radius=FILLET7_R)


solid = lpattern3_1_1.part
